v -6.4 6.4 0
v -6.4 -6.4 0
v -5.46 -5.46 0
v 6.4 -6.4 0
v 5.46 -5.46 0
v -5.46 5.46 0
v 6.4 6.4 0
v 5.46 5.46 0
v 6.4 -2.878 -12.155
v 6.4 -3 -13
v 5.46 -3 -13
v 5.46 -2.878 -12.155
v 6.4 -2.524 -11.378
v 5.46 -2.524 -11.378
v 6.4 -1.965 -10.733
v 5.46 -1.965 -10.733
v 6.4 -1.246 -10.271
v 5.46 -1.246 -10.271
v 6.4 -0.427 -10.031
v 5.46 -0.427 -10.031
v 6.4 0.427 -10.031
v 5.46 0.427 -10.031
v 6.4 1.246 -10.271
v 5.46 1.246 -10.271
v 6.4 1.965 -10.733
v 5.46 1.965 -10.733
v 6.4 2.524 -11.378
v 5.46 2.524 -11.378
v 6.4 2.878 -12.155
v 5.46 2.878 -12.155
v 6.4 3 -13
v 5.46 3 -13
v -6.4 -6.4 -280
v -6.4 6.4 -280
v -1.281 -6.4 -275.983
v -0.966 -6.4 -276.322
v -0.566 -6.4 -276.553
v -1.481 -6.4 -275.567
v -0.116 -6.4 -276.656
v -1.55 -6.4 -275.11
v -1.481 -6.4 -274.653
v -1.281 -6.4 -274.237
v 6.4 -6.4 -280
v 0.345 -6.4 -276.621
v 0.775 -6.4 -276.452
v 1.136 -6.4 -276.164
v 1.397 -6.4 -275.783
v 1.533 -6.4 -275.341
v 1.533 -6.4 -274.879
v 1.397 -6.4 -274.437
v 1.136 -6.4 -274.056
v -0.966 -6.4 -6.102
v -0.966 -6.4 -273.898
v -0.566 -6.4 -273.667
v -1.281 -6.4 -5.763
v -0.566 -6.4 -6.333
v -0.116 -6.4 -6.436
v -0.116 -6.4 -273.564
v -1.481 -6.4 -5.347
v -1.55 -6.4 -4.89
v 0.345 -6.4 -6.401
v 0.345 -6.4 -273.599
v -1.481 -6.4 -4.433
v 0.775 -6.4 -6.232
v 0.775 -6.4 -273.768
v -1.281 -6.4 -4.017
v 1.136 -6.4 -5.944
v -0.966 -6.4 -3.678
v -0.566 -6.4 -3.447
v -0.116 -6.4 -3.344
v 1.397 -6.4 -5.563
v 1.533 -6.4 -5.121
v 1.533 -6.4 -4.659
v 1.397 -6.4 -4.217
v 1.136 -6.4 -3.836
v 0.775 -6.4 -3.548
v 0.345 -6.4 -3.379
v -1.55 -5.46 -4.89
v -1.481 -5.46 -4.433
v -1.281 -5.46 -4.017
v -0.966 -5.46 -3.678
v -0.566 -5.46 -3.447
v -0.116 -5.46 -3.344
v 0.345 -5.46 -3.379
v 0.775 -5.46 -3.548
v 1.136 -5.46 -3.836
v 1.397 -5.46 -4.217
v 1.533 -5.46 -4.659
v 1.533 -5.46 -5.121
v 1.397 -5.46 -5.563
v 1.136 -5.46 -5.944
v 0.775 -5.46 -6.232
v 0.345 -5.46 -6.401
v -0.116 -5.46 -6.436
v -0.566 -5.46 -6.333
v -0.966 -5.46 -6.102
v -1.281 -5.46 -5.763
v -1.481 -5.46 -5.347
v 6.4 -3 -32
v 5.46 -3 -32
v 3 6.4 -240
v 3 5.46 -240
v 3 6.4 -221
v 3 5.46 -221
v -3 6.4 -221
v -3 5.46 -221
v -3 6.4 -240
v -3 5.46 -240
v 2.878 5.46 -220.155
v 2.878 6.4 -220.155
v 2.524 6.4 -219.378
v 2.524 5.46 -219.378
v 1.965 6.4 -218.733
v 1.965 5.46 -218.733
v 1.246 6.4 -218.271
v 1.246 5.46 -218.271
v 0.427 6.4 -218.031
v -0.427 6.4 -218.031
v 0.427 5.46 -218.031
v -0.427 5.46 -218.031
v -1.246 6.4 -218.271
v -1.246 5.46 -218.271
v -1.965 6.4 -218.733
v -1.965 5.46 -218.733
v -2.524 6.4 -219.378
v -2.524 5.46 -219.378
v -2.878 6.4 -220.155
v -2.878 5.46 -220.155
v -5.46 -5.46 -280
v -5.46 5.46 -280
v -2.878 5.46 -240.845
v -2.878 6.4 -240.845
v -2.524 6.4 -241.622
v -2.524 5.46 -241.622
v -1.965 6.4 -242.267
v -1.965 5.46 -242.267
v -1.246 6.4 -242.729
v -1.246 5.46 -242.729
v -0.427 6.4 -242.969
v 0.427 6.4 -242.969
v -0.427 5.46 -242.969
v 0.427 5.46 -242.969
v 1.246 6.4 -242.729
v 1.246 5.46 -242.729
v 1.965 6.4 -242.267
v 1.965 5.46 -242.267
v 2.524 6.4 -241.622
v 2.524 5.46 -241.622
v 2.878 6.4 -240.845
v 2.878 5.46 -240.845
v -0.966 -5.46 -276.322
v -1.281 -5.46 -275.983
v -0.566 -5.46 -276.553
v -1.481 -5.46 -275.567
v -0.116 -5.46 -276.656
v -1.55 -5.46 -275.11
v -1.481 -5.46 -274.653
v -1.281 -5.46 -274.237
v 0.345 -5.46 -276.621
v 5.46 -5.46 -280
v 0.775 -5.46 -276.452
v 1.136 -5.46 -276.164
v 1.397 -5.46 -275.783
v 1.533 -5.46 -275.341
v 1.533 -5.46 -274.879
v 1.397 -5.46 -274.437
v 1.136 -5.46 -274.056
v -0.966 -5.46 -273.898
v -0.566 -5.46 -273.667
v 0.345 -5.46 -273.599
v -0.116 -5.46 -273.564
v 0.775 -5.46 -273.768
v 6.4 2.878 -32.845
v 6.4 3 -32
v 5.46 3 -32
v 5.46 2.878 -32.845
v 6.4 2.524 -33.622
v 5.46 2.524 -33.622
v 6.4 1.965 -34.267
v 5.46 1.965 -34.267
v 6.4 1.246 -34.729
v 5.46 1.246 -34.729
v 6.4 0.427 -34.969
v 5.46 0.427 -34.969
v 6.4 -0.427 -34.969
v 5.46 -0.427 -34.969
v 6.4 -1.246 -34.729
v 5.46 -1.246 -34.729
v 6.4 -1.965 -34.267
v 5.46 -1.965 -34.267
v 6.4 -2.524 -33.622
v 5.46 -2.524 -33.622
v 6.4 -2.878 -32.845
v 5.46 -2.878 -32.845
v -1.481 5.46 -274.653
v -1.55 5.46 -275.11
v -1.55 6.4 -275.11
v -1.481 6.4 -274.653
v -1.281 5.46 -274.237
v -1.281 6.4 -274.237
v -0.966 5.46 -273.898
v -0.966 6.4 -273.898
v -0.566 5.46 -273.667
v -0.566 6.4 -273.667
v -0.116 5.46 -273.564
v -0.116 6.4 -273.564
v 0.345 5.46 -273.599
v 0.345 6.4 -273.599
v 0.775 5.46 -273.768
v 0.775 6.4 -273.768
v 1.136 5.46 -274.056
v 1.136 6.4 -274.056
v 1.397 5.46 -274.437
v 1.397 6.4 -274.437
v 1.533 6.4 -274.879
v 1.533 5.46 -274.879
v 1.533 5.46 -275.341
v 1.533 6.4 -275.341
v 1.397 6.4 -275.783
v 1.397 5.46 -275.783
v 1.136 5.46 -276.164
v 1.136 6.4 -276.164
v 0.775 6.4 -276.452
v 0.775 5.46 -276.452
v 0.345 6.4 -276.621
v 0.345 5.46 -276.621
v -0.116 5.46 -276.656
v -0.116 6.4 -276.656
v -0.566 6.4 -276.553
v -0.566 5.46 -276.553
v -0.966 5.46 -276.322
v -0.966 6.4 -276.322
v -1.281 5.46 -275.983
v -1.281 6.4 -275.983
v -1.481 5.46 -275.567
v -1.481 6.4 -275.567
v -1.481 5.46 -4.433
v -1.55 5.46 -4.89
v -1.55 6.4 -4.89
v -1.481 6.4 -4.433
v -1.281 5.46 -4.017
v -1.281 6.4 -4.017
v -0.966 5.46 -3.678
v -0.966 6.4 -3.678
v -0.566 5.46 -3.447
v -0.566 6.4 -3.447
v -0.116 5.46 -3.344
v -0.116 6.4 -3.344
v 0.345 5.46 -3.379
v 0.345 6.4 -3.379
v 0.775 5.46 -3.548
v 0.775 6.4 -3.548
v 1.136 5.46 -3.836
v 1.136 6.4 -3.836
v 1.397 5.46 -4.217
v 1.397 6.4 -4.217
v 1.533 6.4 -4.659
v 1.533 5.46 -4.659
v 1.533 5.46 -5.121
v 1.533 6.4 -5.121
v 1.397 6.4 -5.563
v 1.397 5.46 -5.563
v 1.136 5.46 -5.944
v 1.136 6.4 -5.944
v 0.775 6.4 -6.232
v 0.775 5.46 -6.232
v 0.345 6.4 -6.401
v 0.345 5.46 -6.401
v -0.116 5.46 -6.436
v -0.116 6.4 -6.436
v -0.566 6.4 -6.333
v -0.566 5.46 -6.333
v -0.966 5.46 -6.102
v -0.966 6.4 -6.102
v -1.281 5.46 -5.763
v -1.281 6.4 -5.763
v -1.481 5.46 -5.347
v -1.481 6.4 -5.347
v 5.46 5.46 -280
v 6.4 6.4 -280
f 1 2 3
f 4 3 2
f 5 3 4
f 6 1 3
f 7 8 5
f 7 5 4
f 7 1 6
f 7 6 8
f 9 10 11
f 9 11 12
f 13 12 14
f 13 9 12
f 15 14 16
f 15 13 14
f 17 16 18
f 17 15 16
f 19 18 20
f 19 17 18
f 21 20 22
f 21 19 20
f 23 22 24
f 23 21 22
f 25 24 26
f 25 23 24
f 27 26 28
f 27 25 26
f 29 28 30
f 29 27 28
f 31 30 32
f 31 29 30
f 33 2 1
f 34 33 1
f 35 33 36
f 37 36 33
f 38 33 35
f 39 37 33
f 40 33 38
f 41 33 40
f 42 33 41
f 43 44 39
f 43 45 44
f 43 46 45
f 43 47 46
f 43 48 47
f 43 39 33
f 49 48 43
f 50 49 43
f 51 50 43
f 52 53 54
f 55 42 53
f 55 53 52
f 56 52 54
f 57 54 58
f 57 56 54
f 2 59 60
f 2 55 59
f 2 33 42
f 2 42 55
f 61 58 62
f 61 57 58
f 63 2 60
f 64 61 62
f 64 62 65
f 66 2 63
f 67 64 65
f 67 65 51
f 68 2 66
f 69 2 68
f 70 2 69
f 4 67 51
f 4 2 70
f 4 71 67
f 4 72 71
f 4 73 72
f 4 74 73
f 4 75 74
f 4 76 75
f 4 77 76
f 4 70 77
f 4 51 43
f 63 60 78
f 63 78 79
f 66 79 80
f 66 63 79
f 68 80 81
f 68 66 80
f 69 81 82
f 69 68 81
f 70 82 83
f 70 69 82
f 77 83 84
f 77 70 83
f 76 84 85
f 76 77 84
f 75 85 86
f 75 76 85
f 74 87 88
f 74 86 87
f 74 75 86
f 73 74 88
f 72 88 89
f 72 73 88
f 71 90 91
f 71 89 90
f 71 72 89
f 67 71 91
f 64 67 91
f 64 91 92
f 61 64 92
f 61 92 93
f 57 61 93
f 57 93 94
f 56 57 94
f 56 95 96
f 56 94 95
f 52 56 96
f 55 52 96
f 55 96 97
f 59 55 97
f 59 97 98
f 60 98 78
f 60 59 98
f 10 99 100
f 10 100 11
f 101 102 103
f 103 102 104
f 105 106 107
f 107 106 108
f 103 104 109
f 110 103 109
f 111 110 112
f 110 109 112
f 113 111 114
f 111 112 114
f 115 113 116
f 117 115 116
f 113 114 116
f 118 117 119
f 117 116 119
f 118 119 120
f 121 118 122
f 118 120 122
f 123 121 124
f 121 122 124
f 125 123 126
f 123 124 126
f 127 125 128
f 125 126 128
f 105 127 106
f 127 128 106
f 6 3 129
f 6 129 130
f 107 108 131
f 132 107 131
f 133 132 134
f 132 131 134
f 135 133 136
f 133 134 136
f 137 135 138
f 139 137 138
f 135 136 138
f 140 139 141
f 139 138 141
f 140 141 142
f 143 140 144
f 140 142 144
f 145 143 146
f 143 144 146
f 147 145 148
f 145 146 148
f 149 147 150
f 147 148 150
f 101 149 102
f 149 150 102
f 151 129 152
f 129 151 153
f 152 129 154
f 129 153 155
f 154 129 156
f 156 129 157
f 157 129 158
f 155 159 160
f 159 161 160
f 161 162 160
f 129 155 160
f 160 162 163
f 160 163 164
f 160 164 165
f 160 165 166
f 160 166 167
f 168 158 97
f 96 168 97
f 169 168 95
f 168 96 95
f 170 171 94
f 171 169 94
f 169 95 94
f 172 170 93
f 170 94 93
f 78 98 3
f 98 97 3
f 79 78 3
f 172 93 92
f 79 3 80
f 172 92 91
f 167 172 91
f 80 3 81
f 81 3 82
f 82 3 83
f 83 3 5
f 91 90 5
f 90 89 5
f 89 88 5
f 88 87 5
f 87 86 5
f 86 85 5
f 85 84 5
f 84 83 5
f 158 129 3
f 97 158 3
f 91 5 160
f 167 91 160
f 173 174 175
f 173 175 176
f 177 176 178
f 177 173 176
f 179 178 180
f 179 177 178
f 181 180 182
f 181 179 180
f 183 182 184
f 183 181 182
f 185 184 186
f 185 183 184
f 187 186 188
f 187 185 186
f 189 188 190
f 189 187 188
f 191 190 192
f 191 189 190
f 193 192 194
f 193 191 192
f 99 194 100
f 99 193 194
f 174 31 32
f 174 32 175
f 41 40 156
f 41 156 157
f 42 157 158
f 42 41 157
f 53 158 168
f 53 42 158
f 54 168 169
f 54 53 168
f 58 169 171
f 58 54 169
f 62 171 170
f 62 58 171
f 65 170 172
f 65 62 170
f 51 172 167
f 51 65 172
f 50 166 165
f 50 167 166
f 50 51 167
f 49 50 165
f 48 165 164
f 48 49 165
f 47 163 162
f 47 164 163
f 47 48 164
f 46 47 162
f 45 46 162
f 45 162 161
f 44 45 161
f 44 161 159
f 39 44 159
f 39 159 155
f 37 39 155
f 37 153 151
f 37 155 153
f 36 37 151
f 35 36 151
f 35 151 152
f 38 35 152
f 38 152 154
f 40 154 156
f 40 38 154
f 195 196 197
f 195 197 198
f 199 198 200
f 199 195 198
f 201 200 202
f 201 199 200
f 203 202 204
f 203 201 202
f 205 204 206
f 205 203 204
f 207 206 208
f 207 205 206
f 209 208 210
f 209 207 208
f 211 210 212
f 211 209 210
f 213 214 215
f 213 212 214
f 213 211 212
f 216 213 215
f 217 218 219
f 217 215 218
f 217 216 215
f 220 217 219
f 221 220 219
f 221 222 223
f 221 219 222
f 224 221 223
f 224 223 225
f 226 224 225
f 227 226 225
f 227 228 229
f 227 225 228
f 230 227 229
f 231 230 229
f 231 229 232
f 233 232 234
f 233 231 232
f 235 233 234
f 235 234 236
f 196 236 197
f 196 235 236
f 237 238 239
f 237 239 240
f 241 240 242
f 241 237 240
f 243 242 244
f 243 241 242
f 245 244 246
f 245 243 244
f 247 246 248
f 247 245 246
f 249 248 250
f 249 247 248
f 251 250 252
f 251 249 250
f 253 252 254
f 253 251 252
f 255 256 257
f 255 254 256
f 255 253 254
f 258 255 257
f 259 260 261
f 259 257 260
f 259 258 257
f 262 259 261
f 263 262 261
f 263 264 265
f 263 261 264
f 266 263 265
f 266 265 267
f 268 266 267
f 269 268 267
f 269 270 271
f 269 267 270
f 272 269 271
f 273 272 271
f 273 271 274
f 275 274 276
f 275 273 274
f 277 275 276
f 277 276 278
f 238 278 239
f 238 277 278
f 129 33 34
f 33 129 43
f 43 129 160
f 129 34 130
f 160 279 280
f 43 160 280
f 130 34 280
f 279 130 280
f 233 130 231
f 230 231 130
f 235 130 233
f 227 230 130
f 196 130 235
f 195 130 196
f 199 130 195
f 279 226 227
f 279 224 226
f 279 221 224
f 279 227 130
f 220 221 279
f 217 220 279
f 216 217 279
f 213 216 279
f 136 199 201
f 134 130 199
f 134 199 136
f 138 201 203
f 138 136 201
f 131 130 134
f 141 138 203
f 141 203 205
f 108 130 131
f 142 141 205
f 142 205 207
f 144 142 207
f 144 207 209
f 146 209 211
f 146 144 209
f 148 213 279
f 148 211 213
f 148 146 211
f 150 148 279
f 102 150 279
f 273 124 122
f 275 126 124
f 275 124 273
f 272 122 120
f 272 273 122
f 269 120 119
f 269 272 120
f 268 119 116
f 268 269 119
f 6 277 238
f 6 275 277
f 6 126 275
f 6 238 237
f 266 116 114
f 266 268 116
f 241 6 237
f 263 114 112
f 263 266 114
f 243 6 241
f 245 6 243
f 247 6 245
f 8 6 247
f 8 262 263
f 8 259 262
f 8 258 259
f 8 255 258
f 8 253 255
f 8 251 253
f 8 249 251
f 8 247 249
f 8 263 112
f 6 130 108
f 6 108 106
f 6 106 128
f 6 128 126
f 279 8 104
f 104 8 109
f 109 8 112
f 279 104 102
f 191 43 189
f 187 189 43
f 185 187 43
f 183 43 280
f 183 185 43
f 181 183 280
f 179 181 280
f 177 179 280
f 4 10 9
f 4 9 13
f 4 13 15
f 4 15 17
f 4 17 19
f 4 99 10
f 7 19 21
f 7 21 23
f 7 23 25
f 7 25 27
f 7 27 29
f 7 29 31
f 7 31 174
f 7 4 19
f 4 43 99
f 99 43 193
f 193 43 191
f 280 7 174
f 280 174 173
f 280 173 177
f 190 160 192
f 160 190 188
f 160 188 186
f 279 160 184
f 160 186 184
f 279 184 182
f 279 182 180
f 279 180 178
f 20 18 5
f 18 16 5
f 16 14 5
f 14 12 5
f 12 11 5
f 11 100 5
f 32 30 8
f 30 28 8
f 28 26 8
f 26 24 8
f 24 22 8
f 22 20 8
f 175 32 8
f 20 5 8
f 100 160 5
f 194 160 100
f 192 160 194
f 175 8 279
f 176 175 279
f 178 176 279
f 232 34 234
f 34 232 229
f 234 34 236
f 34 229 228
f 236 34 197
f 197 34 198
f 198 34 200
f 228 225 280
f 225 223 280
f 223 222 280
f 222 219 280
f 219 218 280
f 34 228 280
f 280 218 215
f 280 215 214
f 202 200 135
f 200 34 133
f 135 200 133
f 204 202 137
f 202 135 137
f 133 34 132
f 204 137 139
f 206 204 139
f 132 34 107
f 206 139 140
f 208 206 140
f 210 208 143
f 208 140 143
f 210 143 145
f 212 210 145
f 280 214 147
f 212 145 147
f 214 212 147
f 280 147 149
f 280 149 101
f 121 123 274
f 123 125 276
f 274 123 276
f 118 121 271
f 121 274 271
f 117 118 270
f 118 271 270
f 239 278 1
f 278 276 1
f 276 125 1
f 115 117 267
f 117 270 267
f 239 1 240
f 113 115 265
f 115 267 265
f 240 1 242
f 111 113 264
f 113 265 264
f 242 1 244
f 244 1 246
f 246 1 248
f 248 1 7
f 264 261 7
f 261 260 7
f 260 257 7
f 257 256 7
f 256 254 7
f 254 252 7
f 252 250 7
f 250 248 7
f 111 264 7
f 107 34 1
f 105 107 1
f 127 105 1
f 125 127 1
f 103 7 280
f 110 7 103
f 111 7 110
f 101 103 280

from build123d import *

# Parameters (mm, degrees)
CROQUIS1_W                 = 12.8
CROQUIS1_H                 = 12.8
CROQUIS1_W_2               = 10.92
CROQUIS1_H_2               = 10.92
EXTRUIR_L_MINA1_DEPTH      = 280
CORTAR_EXTRUIR1_DEPTH      = 10
CORTAR_EXTRUIR1_DEPTH_BACK = 10
CROQUIS2_R                 = 1.55
CORTAR_EXTRUIR2_DEPTH      = 10
CORTAR_EXTRUIR5_DEPTH      = 10


with BuildPart() as part:
    # Croquis1 → Extruir-Lámina1 (new body)
    with BuildSketch(Plane.XY):
        Rectangle(CROQUIS1_W, CROQUIS1_H)
        Rectangle(CROQUIS1_W_2, CROQUIS1_H_2, mode=Mode.SUBTRACT)
    extrude(amount=-EXTRUIR_L_MINA1_DEPTH)

    # Croquis2 → Cortar-Extruir1 (cut, two sides: drawn at the far end of the back side and taken through both)
    with BuildSketch(Plane(origin=(0, 0, 0), x_dir=(1, 0, 0), z_dir=(0, 1, 0)).offset(-CORTAR_EXTRUIR1_DEPTH_BACK)):
        with Locations((0, 4.89)):
            Circle(CROQUIS2_R)
        with Locations((0, 275.11)):
            Circle(CROQUIS2_R)
    extrude(amount=CORTAR_EXTRUIR1_DEPTH + CORTAR_EXTRUIR1_DEPTH_BACK, mode=Mode.SUBTRACT)

    # Croquis2<3> → Cortar-Extruir2 (cut)
    with BuildSketch(Plane(origin=(0, 0, 0), x_dir=(1, 0, 0), z_dir=(0, 1, 0))):
        with BuildLine():
            Line((3, 240), (3, 221))
            ThreePointArc((3, 221), (0, 218), (-3, 221))
            Line((-3, 221), (-3, 240))
            ThreePointArc((-3, 240), (0, 243), (3, 240))
        make_face()
    extrude(amount=CORTAR_EXTRUIR2_DEPTH, mode=Mode.SUBTRACT)

    # Croquis3 → Cortar-Extruir5 (cut)
    with BuildSketch(Plane(origin=(6.4, 0, 0), x_dir=(0, 0, -1), z_dir=(1, 0, 0))):
        with BuildLine():
            Line((13, 3), (32, 3))
            ThreePointArc((32, 3), (35, 0), (32, -3))
            Line((32, -3), (13, -3))
            ThreePointArc((13, -3), (10, 0), (13, 3))
        make_face()
    extrude(amount=-CORTAR_EXTRUIR5_DEPTH, mode=Mode.SUBTRACT)


solid = part.part
